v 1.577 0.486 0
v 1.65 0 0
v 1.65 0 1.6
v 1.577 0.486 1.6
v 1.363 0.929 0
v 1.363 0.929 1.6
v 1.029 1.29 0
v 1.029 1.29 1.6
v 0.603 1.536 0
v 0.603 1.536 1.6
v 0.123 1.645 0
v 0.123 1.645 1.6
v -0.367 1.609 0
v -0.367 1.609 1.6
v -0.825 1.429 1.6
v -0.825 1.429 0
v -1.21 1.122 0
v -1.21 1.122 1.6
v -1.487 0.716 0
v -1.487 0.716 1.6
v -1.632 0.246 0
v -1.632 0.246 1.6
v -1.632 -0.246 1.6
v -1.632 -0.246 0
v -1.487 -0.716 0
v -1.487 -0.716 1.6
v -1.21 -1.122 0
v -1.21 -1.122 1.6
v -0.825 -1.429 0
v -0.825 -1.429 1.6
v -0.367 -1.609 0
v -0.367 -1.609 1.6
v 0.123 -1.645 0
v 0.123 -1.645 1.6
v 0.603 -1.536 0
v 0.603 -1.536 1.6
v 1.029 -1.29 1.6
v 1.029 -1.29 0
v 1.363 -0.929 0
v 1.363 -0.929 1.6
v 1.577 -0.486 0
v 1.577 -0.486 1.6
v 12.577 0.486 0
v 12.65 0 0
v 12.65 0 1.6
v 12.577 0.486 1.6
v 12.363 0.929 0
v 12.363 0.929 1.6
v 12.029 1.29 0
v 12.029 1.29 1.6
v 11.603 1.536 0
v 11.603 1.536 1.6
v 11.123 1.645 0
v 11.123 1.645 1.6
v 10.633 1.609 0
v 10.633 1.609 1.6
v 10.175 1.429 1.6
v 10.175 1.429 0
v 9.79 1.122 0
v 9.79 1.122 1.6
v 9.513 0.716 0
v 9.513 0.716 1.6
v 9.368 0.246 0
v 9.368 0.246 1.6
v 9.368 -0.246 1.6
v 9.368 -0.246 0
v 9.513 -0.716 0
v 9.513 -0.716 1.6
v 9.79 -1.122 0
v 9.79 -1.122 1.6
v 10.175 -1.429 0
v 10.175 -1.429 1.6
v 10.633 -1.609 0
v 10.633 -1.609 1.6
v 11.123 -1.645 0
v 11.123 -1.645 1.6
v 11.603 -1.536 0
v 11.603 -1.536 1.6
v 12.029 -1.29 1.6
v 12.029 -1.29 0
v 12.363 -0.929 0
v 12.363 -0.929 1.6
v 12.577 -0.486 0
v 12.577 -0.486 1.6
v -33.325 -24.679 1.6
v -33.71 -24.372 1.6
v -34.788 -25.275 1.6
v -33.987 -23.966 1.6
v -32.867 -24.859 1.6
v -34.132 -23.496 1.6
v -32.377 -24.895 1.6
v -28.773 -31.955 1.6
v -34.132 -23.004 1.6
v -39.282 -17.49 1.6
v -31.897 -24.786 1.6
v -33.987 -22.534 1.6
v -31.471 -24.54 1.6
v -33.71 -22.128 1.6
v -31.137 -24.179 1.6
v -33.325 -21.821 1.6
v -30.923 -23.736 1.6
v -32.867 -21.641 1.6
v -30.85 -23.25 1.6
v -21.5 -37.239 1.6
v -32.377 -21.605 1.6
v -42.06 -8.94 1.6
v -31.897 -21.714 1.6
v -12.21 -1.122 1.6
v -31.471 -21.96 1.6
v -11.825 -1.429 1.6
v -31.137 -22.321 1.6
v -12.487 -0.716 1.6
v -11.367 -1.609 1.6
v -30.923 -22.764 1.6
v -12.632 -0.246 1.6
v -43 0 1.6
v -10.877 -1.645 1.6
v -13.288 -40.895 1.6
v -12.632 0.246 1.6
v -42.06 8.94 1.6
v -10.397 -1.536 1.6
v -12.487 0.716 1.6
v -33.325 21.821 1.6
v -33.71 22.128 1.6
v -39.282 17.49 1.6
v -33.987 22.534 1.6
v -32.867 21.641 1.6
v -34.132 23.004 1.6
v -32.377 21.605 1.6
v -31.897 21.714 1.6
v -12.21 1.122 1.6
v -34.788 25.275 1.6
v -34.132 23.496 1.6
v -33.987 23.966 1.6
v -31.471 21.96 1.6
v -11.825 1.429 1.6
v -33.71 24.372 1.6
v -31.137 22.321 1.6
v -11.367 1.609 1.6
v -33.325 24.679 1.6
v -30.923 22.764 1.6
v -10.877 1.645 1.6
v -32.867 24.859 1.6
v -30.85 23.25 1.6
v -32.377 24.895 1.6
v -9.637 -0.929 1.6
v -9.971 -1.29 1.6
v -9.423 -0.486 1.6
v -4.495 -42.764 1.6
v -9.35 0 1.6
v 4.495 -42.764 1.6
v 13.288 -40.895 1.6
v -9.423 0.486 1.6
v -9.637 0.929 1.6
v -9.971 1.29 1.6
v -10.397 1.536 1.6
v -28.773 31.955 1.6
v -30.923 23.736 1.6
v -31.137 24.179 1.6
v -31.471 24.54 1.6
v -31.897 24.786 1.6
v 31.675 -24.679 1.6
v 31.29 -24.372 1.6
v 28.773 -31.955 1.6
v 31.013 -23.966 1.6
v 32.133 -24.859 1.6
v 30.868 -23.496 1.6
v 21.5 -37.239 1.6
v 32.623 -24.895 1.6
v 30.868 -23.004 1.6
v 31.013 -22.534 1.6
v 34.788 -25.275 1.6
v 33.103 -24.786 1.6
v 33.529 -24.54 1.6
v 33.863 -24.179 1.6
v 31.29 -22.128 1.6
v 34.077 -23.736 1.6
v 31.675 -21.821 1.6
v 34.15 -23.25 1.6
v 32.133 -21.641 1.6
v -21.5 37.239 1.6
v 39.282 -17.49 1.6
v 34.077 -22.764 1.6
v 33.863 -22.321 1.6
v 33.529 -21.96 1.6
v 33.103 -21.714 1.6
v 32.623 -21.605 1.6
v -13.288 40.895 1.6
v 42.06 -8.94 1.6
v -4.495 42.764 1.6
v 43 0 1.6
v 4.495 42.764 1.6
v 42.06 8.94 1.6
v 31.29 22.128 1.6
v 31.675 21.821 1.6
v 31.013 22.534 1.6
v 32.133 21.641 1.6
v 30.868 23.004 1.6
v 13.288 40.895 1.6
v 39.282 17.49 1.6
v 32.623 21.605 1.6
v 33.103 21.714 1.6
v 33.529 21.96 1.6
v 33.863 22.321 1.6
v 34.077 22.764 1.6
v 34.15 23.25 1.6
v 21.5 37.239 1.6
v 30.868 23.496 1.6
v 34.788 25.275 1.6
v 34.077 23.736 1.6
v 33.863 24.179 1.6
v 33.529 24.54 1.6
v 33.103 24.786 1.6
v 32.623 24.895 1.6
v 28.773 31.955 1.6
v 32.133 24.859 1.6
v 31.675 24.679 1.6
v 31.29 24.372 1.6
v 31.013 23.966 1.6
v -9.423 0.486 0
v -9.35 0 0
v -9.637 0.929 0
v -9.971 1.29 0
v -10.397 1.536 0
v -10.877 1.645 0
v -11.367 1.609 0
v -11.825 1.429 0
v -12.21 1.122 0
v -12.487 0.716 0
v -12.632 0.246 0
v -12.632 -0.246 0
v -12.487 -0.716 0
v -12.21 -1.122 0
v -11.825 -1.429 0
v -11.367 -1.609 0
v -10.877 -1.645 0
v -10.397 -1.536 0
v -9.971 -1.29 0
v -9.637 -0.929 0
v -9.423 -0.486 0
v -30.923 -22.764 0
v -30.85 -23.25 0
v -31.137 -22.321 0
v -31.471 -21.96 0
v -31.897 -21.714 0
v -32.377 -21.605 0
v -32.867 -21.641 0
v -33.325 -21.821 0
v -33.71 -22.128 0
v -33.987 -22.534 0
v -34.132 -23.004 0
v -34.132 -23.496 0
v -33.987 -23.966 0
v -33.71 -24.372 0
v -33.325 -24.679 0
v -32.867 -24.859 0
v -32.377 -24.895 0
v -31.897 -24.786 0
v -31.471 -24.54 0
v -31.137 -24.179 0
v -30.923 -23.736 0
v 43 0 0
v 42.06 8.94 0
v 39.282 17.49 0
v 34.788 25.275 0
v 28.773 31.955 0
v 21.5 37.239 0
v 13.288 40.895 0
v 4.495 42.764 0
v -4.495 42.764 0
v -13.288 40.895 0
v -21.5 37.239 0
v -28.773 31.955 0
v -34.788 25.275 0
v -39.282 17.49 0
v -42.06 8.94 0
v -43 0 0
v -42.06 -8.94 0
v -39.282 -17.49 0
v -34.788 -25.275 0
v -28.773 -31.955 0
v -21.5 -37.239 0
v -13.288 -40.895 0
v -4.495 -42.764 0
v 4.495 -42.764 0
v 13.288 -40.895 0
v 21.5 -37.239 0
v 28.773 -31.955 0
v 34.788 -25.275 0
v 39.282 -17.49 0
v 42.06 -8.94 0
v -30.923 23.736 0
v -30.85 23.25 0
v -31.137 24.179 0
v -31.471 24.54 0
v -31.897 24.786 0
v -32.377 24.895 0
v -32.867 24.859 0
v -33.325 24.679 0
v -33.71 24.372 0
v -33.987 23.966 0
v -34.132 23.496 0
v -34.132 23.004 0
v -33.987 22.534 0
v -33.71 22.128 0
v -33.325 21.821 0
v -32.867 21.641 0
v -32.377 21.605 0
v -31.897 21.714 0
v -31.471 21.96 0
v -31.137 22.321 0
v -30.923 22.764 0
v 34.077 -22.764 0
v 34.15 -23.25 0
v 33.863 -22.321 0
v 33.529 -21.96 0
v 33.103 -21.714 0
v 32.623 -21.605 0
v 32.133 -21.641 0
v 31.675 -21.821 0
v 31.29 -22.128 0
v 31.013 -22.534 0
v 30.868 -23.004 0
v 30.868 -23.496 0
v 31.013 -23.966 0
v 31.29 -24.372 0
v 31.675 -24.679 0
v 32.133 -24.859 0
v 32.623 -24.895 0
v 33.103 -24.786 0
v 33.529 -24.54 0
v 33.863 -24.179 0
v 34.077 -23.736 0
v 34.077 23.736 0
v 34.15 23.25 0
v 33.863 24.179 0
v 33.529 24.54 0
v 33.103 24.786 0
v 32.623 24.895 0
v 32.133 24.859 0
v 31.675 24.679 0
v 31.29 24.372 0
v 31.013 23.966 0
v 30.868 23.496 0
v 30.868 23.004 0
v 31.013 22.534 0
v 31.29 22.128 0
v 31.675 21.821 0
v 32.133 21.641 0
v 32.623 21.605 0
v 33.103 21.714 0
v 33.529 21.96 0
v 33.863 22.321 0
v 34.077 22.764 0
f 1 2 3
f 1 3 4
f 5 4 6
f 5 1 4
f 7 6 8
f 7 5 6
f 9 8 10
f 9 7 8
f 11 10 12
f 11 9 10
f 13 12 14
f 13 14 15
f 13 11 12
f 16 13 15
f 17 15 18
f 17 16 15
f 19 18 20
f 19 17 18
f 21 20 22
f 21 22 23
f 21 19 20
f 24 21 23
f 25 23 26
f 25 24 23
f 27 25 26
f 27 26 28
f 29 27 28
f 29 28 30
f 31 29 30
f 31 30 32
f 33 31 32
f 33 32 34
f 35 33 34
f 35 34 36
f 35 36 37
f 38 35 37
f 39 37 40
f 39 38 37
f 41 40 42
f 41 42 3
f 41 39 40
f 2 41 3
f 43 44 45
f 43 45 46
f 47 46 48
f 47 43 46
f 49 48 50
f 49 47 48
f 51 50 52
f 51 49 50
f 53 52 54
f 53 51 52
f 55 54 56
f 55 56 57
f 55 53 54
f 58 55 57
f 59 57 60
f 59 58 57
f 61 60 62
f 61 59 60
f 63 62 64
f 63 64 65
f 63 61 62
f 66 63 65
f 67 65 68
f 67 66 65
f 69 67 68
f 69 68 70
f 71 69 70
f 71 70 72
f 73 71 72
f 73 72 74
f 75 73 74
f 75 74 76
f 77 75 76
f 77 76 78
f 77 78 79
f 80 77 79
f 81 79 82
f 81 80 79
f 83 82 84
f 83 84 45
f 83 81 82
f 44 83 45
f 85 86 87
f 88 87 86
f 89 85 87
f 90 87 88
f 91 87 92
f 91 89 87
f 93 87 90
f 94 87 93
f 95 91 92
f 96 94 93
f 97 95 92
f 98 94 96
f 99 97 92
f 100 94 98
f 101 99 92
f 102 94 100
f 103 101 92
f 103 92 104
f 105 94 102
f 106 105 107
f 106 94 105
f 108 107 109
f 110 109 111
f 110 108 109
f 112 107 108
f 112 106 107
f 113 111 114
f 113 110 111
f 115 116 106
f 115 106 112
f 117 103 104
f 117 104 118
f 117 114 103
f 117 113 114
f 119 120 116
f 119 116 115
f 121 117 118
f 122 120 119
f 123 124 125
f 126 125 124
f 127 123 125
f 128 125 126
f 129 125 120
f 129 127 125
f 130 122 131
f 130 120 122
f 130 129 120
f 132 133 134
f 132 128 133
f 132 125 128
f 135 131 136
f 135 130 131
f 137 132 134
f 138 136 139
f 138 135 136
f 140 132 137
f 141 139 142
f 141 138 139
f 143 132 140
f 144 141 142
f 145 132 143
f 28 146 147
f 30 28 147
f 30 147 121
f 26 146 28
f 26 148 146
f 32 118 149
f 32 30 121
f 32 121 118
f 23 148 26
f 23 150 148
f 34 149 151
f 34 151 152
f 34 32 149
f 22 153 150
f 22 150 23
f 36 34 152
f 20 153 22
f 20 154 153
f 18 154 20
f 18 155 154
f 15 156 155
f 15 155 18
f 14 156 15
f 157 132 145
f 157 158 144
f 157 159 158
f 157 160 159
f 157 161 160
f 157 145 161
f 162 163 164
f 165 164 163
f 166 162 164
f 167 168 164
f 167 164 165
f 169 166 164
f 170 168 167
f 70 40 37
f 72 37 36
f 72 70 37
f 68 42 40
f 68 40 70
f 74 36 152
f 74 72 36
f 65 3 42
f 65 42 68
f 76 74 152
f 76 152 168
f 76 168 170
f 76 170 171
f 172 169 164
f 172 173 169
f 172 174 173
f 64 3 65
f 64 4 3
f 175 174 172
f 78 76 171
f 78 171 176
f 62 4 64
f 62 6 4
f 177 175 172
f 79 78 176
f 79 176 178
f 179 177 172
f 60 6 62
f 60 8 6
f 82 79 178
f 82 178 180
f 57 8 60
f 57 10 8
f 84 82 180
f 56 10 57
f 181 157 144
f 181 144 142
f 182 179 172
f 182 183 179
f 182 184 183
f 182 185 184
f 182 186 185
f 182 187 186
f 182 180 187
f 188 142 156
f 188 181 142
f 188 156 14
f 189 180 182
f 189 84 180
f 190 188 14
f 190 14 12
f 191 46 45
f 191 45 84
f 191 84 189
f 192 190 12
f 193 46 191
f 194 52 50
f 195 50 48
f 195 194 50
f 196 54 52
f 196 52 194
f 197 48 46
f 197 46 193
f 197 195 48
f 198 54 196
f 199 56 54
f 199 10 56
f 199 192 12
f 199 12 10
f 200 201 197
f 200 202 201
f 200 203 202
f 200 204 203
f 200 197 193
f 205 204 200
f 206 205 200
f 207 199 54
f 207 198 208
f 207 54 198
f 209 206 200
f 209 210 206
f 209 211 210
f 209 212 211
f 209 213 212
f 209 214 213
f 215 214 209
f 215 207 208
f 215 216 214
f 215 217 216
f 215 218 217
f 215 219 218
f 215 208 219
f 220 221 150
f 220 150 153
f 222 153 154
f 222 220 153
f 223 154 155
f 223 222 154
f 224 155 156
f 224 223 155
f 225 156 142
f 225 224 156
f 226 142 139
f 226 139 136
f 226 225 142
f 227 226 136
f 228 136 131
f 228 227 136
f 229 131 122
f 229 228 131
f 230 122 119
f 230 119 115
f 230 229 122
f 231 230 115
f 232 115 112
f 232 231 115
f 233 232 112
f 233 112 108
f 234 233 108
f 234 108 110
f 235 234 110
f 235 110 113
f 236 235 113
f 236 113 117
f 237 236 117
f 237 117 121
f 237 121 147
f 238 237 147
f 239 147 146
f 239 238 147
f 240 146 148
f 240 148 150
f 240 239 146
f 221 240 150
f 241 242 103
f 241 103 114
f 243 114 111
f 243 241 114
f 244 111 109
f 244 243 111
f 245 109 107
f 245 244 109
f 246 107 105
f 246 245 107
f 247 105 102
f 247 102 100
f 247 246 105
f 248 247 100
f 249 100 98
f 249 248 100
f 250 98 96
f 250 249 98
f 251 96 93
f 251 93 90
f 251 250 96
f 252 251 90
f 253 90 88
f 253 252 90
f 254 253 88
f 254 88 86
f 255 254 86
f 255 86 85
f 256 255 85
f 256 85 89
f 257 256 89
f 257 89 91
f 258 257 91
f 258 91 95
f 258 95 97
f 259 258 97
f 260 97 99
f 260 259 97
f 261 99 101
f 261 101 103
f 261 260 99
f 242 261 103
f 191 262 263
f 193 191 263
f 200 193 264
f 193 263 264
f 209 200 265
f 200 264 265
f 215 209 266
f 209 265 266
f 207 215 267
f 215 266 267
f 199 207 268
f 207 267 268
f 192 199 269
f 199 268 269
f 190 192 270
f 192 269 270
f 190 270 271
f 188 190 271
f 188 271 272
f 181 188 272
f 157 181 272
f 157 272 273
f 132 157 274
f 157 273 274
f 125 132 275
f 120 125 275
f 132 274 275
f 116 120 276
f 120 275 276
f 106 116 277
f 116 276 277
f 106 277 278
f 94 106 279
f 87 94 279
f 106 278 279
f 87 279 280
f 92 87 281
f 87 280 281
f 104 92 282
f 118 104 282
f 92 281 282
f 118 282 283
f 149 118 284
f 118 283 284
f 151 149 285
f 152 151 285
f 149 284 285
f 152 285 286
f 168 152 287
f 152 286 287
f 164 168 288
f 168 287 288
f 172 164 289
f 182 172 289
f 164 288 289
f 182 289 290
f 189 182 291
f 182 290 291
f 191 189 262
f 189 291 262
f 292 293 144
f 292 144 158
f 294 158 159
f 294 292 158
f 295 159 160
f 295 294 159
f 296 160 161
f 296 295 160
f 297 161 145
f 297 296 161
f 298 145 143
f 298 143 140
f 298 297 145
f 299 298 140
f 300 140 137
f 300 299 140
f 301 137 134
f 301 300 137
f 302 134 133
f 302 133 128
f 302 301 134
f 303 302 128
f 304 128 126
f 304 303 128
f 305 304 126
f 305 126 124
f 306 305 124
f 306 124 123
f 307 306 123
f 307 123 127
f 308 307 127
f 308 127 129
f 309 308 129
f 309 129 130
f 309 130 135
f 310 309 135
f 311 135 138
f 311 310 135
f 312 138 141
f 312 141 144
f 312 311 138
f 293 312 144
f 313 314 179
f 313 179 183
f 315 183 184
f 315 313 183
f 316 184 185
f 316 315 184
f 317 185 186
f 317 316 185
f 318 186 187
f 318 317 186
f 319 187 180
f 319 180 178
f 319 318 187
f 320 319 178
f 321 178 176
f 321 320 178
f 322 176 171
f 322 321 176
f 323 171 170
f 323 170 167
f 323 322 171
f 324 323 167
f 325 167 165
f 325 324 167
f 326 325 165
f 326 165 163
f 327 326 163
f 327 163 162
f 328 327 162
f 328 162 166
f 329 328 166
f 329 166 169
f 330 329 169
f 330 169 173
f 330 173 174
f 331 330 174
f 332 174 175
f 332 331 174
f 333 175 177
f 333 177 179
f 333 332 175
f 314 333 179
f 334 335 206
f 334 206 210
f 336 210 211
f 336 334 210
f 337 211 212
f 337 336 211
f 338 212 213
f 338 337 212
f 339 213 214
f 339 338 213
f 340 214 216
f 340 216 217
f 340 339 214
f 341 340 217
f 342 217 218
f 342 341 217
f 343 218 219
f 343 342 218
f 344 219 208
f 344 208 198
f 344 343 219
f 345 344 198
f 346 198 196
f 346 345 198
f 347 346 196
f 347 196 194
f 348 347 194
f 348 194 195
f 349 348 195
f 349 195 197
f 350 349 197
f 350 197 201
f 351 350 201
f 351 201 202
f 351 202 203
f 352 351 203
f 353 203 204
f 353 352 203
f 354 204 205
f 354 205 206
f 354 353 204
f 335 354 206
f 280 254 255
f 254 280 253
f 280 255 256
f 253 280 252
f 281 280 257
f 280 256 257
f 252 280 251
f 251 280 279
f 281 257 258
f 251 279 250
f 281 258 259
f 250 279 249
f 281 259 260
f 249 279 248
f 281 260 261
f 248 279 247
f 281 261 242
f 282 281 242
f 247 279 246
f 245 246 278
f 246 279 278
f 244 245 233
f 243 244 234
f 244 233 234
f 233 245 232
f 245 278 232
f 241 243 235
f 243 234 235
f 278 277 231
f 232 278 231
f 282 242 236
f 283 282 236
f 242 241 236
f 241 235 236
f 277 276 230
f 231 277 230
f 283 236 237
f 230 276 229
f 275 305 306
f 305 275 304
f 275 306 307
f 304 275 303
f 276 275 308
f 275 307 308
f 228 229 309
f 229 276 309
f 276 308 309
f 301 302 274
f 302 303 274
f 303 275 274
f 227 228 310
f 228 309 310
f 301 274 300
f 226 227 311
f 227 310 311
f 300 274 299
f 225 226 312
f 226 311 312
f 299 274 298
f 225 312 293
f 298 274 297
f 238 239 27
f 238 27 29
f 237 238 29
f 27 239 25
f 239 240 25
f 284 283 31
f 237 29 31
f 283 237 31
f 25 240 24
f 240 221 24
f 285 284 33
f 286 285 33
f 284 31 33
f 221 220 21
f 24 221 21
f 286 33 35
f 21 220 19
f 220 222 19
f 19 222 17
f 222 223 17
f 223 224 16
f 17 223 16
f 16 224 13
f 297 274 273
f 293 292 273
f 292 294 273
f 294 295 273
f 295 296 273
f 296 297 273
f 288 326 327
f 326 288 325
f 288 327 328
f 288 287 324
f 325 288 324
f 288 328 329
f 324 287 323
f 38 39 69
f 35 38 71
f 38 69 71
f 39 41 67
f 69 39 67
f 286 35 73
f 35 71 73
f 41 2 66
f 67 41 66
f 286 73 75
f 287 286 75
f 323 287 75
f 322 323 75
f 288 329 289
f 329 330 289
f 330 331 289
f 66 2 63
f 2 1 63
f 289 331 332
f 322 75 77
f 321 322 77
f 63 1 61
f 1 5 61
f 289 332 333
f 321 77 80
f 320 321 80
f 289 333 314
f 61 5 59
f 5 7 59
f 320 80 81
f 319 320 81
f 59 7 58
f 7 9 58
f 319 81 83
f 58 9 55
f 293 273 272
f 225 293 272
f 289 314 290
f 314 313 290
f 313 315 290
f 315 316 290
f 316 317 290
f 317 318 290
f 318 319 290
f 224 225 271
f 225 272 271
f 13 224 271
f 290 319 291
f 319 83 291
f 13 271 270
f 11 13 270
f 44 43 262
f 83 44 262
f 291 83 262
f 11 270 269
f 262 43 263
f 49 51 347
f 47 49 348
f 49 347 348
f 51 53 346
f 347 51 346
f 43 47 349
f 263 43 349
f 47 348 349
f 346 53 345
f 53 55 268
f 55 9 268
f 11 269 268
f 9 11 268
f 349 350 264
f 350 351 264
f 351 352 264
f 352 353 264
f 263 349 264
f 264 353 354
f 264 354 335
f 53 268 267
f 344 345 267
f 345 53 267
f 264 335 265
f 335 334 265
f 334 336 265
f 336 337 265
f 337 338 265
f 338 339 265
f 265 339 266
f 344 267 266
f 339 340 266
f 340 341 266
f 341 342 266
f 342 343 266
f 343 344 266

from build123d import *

# Parameters (mm, degrees)
F0_R     = 43
F0_R_2   = 1.65
F0_R_3   = 25
F1_DEPTH = 1.6


with BuildPart() as f1:
    # F0 (on Top) → F1 (new body)
    with BuildSketch(Plane.XY):
        Circle(F0_R)
        with Locations((-32.5, -23.25)):
            Circle(F0_R_2, mode=Mode.SUBTRACT)
        with Locations((32.5, -23.25)):
            Circle(F0_R_2, mode=Mode.SUBTRACT)
        with Locations((-32.5, 23.25)):
            Circle(F0_R_2, mode=Mode.SUBTRACT)
        Circle(F0_R_3, mode=Mode.SUBTRACT)
        with Locations((32.5, 23.25)):
            Circle(F0_R_2, mode=Mode.SUBTRACT)
        Circle(F0_R_3)
        with Locations((-11, 0)):
            Circle(F0_R_2, mode=Mode.SUBTRACT)
        Circle(F0_R_2, mode=Mode.SUBTRACT)
        with Locations((11, 0)):
            Circle(F0_R_2, mode=Mode.SUBTRACT)
    extrude(amount=F1_DEPTH)


solid = f1.part
